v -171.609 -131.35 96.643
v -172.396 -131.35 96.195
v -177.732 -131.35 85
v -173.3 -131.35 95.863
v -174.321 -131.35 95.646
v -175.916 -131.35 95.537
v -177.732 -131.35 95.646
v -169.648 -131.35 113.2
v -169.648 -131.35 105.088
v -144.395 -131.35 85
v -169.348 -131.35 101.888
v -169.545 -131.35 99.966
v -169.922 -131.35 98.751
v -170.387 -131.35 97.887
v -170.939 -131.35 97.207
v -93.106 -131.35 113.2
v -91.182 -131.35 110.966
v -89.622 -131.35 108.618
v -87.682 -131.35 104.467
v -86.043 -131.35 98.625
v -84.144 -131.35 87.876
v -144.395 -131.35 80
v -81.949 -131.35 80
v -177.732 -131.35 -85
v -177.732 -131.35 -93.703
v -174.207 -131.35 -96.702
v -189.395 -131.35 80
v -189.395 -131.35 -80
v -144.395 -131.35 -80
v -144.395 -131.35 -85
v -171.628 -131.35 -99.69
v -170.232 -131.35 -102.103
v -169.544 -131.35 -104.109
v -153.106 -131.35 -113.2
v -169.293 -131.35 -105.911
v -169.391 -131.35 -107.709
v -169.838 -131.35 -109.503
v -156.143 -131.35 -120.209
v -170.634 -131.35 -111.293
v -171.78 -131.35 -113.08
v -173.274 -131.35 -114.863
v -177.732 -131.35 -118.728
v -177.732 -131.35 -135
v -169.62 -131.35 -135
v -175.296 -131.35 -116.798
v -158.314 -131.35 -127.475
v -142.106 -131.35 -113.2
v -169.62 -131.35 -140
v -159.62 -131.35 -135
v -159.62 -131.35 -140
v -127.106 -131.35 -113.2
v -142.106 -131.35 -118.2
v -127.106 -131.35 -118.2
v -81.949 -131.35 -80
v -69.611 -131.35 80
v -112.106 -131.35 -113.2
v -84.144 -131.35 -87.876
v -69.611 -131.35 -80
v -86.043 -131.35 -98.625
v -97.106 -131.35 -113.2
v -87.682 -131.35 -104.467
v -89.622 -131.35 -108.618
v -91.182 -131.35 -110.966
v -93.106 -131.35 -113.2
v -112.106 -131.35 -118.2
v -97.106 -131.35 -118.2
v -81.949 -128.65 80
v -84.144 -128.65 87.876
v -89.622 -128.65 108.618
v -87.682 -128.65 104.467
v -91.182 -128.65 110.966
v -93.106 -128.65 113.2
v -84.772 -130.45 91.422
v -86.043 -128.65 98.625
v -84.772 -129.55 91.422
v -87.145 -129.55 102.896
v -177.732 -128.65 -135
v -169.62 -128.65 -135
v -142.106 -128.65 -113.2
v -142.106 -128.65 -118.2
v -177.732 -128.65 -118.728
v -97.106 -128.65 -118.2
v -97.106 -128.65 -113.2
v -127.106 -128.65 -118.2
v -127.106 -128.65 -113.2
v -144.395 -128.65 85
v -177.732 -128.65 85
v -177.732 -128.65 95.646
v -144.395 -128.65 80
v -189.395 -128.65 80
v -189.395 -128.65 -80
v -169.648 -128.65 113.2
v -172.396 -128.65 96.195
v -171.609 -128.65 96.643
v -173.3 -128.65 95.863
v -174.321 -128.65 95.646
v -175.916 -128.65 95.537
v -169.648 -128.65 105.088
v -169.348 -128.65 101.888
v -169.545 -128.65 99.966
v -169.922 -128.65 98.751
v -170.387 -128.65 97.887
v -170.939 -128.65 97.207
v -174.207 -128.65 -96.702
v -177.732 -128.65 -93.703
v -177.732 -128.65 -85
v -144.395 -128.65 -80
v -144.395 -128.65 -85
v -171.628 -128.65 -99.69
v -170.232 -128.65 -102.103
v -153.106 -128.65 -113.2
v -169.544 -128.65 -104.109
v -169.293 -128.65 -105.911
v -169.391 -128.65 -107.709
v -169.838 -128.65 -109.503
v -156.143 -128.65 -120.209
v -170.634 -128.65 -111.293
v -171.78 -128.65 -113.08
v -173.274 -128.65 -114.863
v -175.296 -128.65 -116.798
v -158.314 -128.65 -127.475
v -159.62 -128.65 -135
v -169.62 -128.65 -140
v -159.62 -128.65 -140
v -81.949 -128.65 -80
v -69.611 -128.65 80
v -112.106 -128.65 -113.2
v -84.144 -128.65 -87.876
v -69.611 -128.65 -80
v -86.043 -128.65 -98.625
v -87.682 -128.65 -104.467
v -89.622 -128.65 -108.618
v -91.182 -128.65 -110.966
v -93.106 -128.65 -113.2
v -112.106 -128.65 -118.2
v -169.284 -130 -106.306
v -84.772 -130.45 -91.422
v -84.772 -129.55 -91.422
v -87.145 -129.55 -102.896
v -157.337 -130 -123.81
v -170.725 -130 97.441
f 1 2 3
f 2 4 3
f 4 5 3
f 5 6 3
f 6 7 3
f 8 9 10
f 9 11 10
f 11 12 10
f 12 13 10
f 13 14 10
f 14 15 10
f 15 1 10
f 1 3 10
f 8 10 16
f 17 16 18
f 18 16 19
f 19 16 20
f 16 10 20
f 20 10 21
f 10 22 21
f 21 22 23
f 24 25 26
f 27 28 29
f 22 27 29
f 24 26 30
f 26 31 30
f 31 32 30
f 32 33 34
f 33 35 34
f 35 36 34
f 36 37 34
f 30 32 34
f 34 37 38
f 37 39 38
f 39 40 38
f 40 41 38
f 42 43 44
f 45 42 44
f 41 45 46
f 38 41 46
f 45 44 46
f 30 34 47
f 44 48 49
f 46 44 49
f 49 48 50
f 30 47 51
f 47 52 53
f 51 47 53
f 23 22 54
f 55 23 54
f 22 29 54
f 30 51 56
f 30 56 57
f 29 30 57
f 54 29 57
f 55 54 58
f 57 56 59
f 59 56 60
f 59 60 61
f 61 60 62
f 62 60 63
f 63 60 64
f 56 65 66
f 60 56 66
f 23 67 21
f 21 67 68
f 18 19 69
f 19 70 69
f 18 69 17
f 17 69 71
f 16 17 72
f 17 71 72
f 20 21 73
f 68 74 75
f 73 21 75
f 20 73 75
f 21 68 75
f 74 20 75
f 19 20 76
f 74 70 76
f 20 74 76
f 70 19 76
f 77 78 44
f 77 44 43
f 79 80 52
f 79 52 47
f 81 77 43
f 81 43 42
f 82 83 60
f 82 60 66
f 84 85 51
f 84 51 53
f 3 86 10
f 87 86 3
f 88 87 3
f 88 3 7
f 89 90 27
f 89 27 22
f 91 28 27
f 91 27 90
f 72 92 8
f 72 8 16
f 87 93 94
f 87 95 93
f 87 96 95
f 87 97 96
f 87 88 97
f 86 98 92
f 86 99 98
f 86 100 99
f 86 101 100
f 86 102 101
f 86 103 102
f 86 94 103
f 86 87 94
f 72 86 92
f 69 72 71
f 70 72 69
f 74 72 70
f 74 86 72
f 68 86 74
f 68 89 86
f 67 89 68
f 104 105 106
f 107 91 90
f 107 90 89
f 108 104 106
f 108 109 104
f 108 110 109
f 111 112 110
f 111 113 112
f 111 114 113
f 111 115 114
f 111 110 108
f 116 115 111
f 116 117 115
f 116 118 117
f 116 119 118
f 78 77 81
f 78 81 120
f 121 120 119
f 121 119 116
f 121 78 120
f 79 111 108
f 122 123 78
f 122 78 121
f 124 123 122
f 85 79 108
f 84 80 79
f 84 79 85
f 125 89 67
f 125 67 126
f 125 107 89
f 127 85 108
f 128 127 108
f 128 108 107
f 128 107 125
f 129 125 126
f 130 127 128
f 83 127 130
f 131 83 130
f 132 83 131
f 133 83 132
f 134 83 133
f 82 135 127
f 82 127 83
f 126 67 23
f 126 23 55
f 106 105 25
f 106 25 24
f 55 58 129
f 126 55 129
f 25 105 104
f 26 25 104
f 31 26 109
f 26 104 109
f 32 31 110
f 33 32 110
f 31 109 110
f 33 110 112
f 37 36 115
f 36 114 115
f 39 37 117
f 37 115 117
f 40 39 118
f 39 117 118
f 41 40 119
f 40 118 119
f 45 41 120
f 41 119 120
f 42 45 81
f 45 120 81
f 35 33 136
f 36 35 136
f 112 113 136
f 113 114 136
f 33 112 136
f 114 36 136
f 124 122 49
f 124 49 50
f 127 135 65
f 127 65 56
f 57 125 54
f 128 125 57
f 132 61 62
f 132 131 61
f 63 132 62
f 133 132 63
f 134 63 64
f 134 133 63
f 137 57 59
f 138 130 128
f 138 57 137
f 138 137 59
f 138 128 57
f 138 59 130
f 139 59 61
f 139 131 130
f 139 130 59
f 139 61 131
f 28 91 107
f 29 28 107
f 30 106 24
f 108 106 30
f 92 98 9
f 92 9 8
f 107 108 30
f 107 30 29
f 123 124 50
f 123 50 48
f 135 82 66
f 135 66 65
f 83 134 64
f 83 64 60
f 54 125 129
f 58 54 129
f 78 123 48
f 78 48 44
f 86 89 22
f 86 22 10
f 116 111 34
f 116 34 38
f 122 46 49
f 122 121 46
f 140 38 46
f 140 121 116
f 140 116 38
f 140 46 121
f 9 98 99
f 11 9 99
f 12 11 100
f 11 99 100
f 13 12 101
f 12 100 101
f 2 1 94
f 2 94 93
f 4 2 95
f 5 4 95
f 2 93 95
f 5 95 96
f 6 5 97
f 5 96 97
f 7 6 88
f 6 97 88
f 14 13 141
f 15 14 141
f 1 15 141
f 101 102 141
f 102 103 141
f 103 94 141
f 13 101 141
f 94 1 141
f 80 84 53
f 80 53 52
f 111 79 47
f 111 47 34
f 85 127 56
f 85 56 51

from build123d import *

# Parameters (mm, degrees)
SKETCH1_W           = 119.784208154
SKETCH1_H           = 2.7
BOSS_EXTRUDE1_DEPTH = 80
BOSS_EXTRUDE2_DEPTH = 2.7


with BuildPart() as part:
    # Sketch1 → Boss-Extrude1 (new, symmetric)
    with BuildSketch(Plane.XY):
        with Locations((-129.502935336, -130)):
            Rectangle(SKETCH1_W, SKETCH1_H)
    extrude(amount=BOSS_EXTRUDE1_DEPTH, both=True)

    # Sketch2 → Boss-Extrude2 (add)
    with BuildSketch(Plane(origin=(0, -128.65, 0), x_dir=(1, 0, 0), z_dir=(0, 1, 0))):
        with BuildLine():
            Line((-169.648055861, -113.2), (-93.105798555, -113.2))
            add(Edge.make_bspline(
                [(-81.948677427, -80), (-86.342810108, -90.98944534), (-84.004205112, -103.888102009), (-93.105798555, -113.2)],
                knots=[0, 0, 0, 0, 1, 1, 1, 1], degree=3))
            Line((-81.948677427, -80), (-81.948677427, -77.720195576))
            Line((-81.948677427, -77.720195576), (-177.731759246, -77.720195576))
            Line((-177.731759246, -77.720195576), (-177.731759246, -80))
            Line((-177.731759246, -80), (-144.395039413, -80))
            Line((-144.395039413, -80), (-144.395039413, -85))
            Line((-144.395039413, -85), (-177.731759246, -85))
            Line((-177.731759246, -85), (-177.731759246, -95.646483093))
            add(Edge.make_bspline(
                [(-169.648055861, -105.087652523), (-167.760228738, -94.514197341), (-177.731759246, -95.646483093)],
                knots=[0, 0, 0, 1, 1, 1], degree=2))
            Line((-169.648055861, -105.087652523), (-169.648055861, -113.2))
        make_face()
        with BuildLine():
            Line((-177.731759246, 80), (-177.731759246, 77.720195576))
            Line((-177.731759246, 77.720195576), (-81.948677427, 77.720195576))
            Line((-81.948677427, 77.720195576), (-81.948677427, 80))
            add(Edge.make_bspline(
                [(-81.948677427, 80), (-86.342810108, 90.98944534), (-84.004205112, 103.888102009), (-93.105798555, 113.2)],
                knots=[0, 0, 0, 0, 1, 1, 1, 1], degree=3))
            Line((-93.105798555, 113.2), (-97.105798555, 113.2))
            Line((-97.105798555, 113.2), (-97.105798555, 118.2))
            Line((-97.105798555, 118.2), (-112.105798555, 118.2))
            Line((-112.105798555, 118.2), (-112.105798555, 113.2))
            Line((-112.105798555, 113.2), (-127.105798555, 113.2))
            Line((-127.105798555, 113.2), (-127.105798555, 118.2))
            Line((-127.105798555, 118.2), (-142.105798555, 118.2))
            Line((-142.105798555, 118.2), (-142.105798555, 113.2))
            Line((-142.105798555, 113.2), (-153.105798555, 113.2))
            add(Edge.make_bspline(
                [(-153.105798555, 113.2), (-158.310437451, 123.519674565), (-159.620228805, 135)],
                knots=[0, 0, 0, 1, 1, 1], degree=2))
            Line((-159.620228805, 135), (-159.620228805, 140))
            Line((-159.620228805, 140), (-169.620228805, 140))
            Line((-169.620228805, 140), (-169.620228805, 135))
            Line((-169.620228805, 135), (-177.731759246, 135))
            Line((-177.731759246, 135), (-177.731759246, 118.728473066))
            add(Edge.make_bspline(
                [(-177.731759246, 93.702985707), (-160.836478184, 106.395581303), (-177.731759246, 118.728473066)],
                knots=[0, 0, 0, 1, 1, 1], degree=2))
            Line((-177.731759246, 93.702985707), (-177.731759246, 85))
            Line((-177.731759246, 85), (-144.395039413, 85))
            Line((-144.395039413, 85), (-144.395039413, 80))
            Line((-144.395039413, 80), (-177.731759246, 80))
        make_face()
    extrude(amount=-BOSS_EXTRUDE2_DEPTH)


solid = part.part
